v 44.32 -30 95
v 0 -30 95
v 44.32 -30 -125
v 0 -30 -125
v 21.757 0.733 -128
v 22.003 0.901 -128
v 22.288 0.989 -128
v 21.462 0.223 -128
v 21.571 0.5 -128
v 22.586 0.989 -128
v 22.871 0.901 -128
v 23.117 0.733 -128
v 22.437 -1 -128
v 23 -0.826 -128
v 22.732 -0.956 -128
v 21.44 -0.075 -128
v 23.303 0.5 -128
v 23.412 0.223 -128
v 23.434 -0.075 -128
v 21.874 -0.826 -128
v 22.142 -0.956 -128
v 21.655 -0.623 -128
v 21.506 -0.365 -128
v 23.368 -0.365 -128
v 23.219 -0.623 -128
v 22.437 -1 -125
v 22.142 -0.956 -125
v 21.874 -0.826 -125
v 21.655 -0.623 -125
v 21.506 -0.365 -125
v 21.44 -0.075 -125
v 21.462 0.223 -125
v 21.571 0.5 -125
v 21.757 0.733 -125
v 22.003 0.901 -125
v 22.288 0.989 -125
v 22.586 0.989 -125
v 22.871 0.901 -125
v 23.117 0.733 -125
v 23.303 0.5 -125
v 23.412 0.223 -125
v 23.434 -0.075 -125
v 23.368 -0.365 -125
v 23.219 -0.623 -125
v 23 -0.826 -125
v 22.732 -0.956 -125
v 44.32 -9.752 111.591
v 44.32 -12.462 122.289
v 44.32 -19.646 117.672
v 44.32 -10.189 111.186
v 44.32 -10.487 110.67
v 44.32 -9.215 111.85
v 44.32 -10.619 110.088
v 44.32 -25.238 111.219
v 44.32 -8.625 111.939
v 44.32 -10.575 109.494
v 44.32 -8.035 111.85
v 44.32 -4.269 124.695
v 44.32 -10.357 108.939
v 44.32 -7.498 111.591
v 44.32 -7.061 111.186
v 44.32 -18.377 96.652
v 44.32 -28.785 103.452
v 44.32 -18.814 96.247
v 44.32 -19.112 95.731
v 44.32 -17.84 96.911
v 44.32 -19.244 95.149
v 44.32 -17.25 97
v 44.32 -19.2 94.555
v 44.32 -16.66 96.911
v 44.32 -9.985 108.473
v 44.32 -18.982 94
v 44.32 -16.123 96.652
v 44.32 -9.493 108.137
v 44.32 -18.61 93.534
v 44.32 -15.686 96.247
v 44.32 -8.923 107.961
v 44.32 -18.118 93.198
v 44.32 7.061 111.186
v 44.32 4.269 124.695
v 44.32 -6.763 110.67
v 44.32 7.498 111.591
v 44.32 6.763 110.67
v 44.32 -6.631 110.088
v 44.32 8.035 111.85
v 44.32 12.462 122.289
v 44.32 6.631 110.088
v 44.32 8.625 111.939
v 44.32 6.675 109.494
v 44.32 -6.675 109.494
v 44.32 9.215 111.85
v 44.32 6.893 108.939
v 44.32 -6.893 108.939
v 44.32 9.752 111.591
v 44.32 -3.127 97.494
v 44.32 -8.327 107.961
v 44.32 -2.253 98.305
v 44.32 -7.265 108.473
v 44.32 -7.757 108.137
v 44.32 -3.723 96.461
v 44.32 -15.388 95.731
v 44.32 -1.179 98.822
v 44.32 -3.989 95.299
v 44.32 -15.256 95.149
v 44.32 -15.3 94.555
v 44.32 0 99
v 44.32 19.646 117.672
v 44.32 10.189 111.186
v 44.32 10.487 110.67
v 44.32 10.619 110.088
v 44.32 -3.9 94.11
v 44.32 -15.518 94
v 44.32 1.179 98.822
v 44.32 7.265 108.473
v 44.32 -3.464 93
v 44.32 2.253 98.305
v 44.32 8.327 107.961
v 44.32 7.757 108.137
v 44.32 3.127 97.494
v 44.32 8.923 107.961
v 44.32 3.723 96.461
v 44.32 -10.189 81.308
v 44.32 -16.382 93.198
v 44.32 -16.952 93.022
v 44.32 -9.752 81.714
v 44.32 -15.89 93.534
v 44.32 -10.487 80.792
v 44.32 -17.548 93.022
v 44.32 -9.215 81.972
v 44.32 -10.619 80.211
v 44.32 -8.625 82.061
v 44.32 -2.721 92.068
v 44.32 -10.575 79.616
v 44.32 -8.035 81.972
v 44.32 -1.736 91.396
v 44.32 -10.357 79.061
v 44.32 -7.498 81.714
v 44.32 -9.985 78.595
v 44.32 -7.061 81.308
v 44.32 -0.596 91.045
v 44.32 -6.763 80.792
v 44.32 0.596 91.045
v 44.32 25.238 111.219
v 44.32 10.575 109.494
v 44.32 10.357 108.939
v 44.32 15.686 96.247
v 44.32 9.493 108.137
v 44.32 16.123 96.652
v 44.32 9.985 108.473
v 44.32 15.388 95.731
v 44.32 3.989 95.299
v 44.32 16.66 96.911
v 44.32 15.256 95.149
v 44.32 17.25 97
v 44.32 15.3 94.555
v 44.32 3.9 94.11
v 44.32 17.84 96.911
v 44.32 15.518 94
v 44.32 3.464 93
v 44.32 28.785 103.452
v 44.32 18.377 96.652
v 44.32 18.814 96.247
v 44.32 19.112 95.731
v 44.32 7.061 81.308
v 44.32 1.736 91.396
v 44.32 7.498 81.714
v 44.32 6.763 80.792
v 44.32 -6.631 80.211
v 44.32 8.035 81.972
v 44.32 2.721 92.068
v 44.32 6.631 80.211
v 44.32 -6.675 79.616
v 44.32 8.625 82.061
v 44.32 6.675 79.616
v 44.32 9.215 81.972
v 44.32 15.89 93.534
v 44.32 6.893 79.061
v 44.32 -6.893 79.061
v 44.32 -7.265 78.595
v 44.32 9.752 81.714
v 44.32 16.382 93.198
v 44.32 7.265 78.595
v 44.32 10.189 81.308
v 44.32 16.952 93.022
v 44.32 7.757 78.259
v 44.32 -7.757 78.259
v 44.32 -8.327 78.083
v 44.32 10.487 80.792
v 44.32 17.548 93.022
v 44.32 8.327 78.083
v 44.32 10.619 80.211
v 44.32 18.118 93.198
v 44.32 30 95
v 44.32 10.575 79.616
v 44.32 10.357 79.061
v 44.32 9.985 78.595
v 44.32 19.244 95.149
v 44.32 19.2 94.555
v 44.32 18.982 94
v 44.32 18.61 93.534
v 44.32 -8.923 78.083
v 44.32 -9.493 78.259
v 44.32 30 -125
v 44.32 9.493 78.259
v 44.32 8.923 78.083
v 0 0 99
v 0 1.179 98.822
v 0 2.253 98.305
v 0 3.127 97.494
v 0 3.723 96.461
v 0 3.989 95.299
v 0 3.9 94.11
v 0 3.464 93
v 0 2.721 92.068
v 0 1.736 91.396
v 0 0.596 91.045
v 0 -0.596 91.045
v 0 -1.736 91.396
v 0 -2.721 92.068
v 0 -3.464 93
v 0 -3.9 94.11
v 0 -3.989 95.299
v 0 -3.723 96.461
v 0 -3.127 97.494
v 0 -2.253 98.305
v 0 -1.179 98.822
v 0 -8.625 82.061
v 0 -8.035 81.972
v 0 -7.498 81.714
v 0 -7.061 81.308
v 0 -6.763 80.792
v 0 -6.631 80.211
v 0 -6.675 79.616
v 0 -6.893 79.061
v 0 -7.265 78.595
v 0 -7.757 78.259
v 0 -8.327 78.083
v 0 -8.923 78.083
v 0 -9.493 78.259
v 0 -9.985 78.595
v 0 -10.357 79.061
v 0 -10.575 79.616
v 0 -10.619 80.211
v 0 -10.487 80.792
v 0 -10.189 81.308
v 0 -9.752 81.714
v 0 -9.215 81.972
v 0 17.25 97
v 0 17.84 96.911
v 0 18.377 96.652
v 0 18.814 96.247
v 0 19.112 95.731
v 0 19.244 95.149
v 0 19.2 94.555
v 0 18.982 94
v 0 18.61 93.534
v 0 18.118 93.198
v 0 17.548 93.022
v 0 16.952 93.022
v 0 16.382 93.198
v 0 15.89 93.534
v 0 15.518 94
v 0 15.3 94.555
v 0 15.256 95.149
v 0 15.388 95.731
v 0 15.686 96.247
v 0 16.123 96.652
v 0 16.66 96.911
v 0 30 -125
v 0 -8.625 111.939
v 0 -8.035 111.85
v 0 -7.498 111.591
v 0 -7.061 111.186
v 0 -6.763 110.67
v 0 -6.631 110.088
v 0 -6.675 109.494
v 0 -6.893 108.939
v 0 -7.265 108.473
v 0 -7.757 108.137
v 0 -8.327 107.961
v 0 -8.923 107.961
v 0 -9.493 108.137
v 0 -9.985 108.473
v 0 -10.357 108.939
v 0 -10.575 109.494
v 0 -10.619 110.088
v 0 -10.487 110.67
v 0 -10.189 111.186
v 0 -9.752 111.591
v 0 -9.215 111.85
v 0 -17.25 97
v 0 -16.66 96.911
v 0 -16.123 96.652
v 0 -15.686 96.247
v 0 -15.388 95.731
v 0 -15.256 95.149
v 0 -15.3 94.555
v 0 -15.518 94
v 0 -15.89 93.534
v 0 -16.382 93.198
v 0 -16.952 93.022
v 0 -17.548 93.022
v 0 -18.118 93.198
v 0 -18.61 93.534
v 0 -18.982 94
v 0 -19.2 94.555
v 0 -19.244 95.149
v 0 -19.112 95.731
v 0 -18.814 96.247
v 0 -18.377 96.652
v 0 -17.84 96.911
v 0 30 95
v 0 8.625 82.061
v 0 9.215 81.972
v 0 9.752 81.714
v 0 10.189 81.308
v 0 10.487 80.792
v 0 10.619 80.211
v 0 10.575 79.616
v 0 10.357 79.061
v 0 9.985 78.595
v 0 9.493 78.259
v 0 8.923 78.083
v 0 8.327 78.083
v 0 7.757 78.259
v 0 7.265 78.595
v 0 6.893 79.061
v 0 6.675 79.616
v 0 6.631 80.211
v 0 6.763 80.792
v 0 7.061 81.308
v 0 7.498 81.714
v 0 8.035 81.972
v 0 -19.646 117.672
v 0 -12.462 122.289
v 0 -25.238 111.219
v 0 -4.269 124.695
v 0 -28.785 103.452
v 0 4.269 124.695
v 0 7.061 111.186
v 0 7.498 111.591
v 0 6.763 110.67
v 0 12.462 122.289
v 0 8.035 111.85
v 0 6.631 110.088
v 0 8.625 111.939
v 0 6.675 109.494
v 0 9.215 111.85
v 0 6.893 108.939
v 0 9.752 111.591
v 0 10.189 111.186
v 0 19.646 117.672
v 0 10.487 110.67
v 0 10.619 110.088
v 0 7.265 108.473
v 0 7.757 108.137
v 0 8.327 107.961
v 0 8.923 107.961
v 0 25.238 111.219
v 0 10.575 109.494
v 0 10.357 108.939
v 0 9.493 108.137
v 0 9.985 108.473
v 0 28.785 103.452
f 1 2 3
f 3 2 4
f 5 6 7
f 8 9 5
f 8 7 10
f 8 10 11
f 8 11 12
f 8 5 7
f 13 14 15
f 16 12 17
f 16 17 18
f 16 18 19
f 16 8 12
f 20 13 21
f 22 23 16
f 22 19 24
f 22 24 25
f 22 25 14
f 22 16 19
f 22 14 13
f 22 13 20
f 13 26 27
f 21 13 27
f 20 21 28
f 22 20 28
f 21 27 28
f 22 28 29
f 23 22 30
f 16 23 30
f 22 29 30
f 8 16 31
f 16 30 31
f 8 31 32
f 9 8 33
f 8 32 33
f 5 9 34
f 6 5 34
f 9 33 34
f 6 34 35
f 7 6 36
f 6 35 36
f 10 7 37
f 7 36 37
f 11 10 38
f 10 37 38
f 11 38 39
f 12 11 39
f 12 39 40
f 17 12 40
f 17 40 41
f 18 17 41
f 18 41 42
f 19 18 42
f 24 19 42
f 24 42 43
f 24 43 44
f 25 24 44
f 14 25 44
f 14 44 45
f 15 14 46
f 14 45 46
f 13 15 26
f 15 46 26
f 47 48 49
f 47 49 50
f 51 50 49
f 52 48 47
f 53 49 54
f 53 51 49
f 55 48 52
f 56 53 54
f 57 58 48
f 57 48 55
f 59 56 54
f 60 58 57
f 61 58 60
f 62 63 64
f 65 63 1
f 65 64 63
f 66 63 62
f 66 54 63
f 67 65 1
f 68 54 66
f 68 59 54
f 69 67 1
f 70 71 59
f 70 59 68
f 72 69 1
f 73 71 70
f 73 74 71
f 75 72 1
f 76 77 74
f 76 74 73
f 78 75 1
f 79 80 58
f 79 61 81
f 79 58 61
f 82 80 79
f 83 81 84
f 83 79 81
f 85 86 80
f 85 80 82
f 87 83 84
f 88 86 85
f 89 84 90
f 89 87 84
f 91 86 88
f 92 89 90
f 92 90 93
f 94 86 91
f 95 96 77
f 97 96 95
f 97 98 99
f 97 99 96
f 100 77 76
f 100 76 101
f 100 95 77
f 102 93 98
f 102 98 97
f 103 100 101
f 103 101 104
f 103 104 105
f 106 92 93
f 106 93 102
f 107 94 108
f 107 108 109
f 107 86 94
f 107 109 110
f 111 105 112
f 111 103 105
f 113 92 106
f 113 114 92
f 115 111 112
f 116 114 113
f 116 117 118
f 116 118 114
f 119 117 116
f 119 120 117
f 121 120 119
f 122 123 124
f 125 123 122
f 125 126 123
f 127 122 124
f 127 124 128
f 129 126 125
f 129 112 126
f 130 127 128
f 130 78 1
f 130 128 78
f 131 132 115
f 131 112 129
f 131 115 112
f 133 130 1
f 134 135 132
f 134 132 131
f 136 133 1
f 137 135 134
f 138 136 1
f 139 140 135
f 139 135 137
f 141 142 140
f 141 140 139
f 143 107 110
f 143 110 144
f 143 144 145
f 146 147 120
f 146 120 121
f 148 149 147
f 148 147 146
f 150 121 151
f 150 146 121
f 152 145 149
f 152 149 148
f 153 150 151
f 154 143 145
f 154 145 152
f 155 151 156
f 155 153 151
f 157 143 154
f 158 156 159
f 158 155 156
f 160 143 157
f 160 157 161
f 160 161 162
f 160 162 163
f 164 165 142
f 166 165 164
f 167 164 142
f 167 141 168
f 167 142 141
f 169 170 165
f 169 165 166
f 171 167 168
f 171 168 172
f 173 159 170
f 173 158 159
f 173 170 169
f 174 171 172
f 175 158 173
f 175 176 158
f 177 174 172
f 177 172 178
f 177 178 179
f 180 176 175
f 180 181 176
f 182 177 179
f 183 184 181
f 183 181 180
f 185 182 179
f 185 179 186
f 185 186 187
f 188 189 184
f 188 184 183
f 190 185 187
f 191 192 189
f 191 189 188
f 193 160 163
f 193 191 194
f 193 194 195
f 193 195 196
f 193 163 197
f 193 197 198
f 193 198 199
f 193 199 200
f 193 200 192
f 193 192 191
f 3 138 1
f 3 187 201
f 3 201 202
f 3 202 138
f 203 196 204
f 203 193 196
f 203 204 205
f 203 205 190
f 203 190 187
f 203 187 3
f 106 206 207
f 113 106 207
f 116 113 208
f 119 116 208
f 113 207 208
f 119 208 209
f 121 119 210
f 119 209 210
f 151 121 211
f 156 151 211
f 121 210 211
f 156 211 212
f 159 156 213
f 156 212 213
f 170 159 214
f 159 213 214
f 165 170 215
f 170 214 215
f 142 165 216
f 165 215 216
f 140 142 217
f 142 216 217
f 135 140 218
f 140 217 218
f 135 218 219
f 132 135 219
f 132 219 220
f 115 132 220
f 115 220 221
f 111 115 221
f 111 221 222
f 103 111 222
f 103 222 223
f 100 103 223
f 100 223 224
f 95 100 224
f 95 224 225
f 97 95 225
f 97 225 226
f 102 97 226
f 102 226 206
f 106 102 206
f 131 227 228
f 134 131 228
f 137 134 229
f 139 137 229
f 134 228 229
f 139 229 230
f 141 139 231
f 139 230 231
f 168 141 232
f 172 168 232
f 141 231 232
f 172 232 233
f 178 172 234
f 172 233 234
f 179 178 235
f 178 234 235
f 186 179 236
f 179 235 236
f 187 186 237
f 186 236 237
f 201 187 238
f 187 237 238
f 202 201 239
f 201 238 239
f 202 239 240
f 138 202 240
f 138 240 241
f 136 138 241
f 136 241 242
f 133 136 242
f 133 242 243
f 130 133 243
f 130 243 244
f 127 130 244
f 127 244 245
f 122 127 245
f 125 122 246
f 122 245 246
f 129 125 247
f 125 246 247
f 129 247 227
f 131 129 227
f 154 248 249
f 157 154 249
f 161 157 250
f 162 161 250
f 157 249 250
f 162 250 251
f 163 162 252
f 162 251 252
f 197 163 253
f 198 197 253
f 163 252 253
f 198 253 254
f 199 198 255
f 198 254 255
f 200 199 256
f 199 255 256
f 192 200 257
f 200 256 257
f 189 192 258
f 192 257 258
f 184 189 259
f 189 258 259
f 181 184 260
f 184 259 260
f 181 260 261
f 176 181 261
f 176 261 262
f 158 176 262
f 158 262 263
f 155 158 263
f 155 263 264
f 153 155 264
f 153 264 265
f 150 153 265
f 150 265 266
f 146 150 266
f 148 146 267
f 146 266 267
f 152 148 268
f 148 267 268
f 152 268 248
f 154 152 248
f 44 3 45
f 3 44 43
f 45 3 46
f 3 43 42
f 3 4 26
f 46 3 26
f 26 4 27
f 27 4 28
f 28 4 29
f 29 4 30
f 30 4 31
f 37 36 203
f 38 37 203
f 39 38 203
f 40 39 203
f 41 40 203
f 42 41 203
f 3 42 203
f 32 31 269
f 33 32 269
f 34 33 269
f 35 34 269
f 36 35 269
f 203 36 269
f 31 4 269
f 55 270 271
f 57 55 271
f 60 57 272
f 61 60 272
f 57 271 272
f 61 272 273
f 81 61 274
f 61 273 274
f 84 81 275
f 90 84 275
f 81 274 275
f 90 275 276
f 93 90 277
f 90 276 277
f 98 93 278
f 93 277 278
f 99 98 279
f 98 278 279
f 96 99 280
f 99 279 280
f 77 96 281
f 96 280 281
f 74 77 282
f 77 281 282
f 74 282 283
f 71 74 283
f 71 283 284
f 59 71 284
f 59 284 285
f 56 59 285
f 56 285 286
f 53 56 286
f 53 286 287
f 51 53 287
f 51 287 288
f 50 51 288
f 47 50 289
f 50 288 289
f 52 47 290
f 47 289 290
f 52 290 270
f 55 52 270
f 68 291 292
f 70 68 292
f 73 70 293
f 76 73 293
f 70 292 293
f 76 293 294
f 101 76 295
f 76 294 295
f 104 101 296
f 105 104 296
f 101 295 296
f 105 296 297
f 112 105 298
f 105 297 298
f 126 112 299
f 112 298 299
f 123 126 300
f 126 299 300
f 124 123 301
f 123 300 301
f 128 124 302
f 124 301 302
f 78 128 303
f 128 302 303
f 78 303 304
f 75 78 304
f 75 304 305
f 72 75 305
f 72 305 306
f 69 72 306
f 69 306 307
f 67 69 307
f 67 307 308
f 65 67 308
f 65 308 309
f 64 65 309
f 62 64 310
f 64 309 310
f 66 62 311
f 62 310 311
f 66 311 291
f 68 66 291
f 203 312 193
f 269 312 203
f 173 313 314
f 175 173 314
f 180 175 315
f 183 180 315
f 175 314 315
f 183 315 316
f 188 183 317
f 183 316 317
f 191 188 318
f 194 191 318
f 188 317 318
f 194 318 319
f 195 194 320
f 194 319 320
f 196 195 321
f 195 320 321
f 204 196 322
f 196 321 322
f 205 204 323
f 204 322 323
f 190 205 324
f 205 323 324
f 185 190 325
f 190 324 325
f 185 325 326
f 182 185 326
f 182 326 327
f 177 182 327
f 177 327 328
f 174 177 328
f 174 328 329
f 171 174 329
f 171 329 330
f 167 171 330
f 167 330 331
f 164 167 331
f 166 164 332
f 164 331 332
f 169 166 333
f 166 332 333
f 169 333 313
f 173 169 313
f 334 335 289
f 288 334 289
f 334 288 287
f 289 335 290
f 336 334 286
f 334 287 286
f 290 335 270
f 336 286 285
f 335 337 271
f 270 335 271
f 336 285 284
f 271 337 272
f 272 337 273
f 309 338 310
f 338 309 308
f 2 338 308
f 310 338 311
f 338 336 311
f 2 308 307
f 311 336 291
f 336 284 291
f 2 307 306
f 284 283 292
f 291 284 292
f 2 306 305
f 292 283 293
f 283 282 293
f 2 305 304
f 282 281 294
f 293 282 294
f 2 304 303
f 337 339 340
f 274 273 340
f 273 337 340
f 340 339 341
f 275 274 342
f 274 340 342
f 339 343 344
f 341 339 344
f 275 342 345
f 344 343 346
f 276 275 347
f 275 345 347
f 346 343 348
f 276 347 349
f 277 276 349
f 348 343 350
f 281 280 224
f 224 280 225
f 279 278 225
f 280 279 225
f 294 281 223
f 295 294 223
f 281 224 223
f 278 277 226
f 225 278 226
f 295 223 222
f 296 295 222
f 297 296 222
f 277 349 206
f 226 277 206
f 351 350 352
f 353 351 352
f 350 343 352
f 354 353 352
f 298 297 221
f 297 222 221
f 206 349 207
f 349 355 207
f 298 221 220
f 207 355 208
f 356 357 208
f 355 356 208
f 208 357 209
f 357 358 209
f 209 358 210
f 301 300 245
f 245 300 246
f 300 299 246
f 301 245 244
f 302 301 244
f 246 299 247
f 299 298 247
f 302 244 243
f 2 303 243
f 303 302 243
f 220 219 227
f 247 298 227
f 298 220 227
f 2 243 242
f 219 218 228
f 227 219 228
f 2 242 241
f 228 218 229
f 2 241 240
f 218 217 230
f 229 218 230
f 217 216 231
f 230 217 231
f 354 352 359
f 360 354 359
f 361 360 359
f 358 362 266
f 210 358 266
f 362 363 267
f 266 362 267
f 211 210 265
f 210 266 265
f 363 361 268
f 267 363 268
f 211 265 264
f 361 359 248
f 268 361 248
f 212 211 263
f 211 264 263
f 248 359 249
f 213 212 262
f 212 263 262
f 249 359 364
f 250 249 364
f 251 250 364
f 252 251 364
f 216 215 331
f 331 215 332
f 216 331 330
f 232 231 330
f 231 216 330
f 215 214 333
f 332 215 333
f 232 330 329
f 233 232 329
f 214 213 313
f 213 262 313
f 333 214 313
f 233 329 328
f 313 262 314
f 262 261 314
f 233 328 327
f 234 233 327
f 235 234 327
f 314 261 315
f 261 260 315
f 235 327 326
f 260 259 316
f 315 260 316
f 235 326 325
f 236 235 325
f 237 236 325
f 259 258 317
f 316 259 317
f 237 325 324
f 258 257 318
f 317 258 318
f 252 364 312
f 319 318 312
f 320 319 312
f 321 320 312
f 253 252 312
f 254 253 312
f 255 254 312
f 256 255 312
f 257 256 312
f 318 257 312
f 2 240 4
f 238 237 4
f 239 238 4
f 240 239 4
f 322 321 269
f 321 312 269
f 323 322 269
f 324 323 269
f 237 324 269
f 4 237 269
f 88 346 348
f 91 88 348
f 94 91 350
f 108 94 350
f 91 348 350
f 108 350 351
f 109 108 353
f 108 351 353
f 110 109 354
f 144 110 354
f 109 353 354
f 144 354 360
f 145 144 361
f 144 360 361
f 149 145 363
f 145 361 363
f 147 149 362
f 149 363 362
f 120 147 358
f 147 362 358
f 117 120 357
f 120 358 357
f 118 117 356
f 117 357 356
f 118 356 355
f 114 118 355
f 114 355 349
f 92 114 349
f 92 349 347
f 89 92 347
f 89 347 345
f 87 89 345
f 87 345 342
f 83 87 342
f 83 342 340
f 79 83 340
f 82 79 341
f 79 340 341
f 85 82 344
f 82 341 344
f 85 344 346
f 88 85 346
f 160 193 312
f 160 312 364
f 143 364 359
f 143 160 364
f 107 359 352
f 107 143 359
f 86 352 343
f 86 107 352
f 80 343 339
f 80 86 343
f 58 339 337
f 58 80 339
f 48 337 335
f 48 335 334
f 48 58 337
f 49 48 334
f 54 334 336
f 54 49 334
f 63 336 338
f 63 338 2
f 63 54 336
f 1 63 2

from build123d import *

# Parameters (mm, degrees)
SKETCH_1_W          = 250
SKETCH_1_H          = 60
EXTRUDE_2_DEPTH     = 44.32
FILLET_2_RADIUS     = 30
FILLET_2_LENGTH     = 44.32
SKETCH_2_R          = 1
EXTRUDE_3_DEPTH     = 3
SKETCH_3_R          = 2
CUT_EXTRUDE_1_DEPTH = 44.32
SKETCH_4_R          = 4
CUT_EXTRUDE_2_DEPTH = 103


with BuildPart() as part:
    # 草图1 → 凸台-拉伸2 (new body)
    with BuildSketch(Plane(origin=(0, 0, 0), x_dir=(0, 0, -1), z_dir=(1, 0, 0))):
        Rectangle(SKETCH_1_W, SKETCH_1_H)
    extrude(amount=EXTRUDE_2_DEPTH)

    # 圆角2: full round fillet: the end face becomes a half cylinder, R = half its width
    fillet_2_face = Plane((22.16, 0, 125), x_dir=(1, 0, 0), z_dir=(0, 0, 1))  # on the end face: x along it, z out of the body
    fillet_2_slab = fillet_2_face.offset(-FILLET_2_RADIUS / 2) * Box(FILLET_2_LENGTH, 2 * FILLET_2_RADIUS, FILLET_2_RADIUS, mode=Mode.PRIVATE)  # the body's end, R deep
    fillet_2_round = Plane((22.16, 0, 95), x_dir=(0, 0, 1), z_dir=(1, 0, 0)) * Cylinder(FILLET_2_RADIUS, FILLET_2_LENGTH, mode=Mode.PRIVATE)  # its axis R under the face
    add(fillet_2_slab - fillet_2_round, mode=Mode.SUBTRACT)

    # 草图2 → 凸台-拉伸3 (add)
    with BuildSketch(Plane(origin=(0, 0, -125), x_dir=(-1, 0, 0), z_dir=(0, 0, -1))):
        with Locations(Location((-22.436932243, 0, 0), (0, 0, 270))):
            Circle(SKETCH_2_R)
    extrude(amount=EXTRUDE_3_DEPTH)

    # 草图3 → 切除-拉伸1 (cut)
    with BuildSketch(Plane.ZY):
        with Locations((95, 17.25)):
            Circle(SKETCH_3_R)
        with Locations((109.938938215, 8.625)):
            Circle(SKETCH_3_R)
        with Locations((109.938938215, -8.625)):
            Circle(SKETCH_3_R)
        with Locations((95, -17.25)):
            Circle(SKETCH_3_R)
        with Locations((80.061061785, -8.625)):
            Circle(SKETCH_3_R)
        with Locations((80.061061785, 8.625)):
            Circle(SKETCH_3_R)
    extrude(amount=-CUT_EXTRUDE_1_DEPTH, mode=Mode.SUBTRACT)

    # 草图4 → 切除-拉伸2 (cut)
    with BuildSketch(Plane.ZY):
        with Locations((95, 0)):
            Circle(SKETCH_4_R)
    extrude(amount=-CUT_EXTRUDE_2_DEPTH, mode=Mode.SUBTRACT)


solid = part.part
